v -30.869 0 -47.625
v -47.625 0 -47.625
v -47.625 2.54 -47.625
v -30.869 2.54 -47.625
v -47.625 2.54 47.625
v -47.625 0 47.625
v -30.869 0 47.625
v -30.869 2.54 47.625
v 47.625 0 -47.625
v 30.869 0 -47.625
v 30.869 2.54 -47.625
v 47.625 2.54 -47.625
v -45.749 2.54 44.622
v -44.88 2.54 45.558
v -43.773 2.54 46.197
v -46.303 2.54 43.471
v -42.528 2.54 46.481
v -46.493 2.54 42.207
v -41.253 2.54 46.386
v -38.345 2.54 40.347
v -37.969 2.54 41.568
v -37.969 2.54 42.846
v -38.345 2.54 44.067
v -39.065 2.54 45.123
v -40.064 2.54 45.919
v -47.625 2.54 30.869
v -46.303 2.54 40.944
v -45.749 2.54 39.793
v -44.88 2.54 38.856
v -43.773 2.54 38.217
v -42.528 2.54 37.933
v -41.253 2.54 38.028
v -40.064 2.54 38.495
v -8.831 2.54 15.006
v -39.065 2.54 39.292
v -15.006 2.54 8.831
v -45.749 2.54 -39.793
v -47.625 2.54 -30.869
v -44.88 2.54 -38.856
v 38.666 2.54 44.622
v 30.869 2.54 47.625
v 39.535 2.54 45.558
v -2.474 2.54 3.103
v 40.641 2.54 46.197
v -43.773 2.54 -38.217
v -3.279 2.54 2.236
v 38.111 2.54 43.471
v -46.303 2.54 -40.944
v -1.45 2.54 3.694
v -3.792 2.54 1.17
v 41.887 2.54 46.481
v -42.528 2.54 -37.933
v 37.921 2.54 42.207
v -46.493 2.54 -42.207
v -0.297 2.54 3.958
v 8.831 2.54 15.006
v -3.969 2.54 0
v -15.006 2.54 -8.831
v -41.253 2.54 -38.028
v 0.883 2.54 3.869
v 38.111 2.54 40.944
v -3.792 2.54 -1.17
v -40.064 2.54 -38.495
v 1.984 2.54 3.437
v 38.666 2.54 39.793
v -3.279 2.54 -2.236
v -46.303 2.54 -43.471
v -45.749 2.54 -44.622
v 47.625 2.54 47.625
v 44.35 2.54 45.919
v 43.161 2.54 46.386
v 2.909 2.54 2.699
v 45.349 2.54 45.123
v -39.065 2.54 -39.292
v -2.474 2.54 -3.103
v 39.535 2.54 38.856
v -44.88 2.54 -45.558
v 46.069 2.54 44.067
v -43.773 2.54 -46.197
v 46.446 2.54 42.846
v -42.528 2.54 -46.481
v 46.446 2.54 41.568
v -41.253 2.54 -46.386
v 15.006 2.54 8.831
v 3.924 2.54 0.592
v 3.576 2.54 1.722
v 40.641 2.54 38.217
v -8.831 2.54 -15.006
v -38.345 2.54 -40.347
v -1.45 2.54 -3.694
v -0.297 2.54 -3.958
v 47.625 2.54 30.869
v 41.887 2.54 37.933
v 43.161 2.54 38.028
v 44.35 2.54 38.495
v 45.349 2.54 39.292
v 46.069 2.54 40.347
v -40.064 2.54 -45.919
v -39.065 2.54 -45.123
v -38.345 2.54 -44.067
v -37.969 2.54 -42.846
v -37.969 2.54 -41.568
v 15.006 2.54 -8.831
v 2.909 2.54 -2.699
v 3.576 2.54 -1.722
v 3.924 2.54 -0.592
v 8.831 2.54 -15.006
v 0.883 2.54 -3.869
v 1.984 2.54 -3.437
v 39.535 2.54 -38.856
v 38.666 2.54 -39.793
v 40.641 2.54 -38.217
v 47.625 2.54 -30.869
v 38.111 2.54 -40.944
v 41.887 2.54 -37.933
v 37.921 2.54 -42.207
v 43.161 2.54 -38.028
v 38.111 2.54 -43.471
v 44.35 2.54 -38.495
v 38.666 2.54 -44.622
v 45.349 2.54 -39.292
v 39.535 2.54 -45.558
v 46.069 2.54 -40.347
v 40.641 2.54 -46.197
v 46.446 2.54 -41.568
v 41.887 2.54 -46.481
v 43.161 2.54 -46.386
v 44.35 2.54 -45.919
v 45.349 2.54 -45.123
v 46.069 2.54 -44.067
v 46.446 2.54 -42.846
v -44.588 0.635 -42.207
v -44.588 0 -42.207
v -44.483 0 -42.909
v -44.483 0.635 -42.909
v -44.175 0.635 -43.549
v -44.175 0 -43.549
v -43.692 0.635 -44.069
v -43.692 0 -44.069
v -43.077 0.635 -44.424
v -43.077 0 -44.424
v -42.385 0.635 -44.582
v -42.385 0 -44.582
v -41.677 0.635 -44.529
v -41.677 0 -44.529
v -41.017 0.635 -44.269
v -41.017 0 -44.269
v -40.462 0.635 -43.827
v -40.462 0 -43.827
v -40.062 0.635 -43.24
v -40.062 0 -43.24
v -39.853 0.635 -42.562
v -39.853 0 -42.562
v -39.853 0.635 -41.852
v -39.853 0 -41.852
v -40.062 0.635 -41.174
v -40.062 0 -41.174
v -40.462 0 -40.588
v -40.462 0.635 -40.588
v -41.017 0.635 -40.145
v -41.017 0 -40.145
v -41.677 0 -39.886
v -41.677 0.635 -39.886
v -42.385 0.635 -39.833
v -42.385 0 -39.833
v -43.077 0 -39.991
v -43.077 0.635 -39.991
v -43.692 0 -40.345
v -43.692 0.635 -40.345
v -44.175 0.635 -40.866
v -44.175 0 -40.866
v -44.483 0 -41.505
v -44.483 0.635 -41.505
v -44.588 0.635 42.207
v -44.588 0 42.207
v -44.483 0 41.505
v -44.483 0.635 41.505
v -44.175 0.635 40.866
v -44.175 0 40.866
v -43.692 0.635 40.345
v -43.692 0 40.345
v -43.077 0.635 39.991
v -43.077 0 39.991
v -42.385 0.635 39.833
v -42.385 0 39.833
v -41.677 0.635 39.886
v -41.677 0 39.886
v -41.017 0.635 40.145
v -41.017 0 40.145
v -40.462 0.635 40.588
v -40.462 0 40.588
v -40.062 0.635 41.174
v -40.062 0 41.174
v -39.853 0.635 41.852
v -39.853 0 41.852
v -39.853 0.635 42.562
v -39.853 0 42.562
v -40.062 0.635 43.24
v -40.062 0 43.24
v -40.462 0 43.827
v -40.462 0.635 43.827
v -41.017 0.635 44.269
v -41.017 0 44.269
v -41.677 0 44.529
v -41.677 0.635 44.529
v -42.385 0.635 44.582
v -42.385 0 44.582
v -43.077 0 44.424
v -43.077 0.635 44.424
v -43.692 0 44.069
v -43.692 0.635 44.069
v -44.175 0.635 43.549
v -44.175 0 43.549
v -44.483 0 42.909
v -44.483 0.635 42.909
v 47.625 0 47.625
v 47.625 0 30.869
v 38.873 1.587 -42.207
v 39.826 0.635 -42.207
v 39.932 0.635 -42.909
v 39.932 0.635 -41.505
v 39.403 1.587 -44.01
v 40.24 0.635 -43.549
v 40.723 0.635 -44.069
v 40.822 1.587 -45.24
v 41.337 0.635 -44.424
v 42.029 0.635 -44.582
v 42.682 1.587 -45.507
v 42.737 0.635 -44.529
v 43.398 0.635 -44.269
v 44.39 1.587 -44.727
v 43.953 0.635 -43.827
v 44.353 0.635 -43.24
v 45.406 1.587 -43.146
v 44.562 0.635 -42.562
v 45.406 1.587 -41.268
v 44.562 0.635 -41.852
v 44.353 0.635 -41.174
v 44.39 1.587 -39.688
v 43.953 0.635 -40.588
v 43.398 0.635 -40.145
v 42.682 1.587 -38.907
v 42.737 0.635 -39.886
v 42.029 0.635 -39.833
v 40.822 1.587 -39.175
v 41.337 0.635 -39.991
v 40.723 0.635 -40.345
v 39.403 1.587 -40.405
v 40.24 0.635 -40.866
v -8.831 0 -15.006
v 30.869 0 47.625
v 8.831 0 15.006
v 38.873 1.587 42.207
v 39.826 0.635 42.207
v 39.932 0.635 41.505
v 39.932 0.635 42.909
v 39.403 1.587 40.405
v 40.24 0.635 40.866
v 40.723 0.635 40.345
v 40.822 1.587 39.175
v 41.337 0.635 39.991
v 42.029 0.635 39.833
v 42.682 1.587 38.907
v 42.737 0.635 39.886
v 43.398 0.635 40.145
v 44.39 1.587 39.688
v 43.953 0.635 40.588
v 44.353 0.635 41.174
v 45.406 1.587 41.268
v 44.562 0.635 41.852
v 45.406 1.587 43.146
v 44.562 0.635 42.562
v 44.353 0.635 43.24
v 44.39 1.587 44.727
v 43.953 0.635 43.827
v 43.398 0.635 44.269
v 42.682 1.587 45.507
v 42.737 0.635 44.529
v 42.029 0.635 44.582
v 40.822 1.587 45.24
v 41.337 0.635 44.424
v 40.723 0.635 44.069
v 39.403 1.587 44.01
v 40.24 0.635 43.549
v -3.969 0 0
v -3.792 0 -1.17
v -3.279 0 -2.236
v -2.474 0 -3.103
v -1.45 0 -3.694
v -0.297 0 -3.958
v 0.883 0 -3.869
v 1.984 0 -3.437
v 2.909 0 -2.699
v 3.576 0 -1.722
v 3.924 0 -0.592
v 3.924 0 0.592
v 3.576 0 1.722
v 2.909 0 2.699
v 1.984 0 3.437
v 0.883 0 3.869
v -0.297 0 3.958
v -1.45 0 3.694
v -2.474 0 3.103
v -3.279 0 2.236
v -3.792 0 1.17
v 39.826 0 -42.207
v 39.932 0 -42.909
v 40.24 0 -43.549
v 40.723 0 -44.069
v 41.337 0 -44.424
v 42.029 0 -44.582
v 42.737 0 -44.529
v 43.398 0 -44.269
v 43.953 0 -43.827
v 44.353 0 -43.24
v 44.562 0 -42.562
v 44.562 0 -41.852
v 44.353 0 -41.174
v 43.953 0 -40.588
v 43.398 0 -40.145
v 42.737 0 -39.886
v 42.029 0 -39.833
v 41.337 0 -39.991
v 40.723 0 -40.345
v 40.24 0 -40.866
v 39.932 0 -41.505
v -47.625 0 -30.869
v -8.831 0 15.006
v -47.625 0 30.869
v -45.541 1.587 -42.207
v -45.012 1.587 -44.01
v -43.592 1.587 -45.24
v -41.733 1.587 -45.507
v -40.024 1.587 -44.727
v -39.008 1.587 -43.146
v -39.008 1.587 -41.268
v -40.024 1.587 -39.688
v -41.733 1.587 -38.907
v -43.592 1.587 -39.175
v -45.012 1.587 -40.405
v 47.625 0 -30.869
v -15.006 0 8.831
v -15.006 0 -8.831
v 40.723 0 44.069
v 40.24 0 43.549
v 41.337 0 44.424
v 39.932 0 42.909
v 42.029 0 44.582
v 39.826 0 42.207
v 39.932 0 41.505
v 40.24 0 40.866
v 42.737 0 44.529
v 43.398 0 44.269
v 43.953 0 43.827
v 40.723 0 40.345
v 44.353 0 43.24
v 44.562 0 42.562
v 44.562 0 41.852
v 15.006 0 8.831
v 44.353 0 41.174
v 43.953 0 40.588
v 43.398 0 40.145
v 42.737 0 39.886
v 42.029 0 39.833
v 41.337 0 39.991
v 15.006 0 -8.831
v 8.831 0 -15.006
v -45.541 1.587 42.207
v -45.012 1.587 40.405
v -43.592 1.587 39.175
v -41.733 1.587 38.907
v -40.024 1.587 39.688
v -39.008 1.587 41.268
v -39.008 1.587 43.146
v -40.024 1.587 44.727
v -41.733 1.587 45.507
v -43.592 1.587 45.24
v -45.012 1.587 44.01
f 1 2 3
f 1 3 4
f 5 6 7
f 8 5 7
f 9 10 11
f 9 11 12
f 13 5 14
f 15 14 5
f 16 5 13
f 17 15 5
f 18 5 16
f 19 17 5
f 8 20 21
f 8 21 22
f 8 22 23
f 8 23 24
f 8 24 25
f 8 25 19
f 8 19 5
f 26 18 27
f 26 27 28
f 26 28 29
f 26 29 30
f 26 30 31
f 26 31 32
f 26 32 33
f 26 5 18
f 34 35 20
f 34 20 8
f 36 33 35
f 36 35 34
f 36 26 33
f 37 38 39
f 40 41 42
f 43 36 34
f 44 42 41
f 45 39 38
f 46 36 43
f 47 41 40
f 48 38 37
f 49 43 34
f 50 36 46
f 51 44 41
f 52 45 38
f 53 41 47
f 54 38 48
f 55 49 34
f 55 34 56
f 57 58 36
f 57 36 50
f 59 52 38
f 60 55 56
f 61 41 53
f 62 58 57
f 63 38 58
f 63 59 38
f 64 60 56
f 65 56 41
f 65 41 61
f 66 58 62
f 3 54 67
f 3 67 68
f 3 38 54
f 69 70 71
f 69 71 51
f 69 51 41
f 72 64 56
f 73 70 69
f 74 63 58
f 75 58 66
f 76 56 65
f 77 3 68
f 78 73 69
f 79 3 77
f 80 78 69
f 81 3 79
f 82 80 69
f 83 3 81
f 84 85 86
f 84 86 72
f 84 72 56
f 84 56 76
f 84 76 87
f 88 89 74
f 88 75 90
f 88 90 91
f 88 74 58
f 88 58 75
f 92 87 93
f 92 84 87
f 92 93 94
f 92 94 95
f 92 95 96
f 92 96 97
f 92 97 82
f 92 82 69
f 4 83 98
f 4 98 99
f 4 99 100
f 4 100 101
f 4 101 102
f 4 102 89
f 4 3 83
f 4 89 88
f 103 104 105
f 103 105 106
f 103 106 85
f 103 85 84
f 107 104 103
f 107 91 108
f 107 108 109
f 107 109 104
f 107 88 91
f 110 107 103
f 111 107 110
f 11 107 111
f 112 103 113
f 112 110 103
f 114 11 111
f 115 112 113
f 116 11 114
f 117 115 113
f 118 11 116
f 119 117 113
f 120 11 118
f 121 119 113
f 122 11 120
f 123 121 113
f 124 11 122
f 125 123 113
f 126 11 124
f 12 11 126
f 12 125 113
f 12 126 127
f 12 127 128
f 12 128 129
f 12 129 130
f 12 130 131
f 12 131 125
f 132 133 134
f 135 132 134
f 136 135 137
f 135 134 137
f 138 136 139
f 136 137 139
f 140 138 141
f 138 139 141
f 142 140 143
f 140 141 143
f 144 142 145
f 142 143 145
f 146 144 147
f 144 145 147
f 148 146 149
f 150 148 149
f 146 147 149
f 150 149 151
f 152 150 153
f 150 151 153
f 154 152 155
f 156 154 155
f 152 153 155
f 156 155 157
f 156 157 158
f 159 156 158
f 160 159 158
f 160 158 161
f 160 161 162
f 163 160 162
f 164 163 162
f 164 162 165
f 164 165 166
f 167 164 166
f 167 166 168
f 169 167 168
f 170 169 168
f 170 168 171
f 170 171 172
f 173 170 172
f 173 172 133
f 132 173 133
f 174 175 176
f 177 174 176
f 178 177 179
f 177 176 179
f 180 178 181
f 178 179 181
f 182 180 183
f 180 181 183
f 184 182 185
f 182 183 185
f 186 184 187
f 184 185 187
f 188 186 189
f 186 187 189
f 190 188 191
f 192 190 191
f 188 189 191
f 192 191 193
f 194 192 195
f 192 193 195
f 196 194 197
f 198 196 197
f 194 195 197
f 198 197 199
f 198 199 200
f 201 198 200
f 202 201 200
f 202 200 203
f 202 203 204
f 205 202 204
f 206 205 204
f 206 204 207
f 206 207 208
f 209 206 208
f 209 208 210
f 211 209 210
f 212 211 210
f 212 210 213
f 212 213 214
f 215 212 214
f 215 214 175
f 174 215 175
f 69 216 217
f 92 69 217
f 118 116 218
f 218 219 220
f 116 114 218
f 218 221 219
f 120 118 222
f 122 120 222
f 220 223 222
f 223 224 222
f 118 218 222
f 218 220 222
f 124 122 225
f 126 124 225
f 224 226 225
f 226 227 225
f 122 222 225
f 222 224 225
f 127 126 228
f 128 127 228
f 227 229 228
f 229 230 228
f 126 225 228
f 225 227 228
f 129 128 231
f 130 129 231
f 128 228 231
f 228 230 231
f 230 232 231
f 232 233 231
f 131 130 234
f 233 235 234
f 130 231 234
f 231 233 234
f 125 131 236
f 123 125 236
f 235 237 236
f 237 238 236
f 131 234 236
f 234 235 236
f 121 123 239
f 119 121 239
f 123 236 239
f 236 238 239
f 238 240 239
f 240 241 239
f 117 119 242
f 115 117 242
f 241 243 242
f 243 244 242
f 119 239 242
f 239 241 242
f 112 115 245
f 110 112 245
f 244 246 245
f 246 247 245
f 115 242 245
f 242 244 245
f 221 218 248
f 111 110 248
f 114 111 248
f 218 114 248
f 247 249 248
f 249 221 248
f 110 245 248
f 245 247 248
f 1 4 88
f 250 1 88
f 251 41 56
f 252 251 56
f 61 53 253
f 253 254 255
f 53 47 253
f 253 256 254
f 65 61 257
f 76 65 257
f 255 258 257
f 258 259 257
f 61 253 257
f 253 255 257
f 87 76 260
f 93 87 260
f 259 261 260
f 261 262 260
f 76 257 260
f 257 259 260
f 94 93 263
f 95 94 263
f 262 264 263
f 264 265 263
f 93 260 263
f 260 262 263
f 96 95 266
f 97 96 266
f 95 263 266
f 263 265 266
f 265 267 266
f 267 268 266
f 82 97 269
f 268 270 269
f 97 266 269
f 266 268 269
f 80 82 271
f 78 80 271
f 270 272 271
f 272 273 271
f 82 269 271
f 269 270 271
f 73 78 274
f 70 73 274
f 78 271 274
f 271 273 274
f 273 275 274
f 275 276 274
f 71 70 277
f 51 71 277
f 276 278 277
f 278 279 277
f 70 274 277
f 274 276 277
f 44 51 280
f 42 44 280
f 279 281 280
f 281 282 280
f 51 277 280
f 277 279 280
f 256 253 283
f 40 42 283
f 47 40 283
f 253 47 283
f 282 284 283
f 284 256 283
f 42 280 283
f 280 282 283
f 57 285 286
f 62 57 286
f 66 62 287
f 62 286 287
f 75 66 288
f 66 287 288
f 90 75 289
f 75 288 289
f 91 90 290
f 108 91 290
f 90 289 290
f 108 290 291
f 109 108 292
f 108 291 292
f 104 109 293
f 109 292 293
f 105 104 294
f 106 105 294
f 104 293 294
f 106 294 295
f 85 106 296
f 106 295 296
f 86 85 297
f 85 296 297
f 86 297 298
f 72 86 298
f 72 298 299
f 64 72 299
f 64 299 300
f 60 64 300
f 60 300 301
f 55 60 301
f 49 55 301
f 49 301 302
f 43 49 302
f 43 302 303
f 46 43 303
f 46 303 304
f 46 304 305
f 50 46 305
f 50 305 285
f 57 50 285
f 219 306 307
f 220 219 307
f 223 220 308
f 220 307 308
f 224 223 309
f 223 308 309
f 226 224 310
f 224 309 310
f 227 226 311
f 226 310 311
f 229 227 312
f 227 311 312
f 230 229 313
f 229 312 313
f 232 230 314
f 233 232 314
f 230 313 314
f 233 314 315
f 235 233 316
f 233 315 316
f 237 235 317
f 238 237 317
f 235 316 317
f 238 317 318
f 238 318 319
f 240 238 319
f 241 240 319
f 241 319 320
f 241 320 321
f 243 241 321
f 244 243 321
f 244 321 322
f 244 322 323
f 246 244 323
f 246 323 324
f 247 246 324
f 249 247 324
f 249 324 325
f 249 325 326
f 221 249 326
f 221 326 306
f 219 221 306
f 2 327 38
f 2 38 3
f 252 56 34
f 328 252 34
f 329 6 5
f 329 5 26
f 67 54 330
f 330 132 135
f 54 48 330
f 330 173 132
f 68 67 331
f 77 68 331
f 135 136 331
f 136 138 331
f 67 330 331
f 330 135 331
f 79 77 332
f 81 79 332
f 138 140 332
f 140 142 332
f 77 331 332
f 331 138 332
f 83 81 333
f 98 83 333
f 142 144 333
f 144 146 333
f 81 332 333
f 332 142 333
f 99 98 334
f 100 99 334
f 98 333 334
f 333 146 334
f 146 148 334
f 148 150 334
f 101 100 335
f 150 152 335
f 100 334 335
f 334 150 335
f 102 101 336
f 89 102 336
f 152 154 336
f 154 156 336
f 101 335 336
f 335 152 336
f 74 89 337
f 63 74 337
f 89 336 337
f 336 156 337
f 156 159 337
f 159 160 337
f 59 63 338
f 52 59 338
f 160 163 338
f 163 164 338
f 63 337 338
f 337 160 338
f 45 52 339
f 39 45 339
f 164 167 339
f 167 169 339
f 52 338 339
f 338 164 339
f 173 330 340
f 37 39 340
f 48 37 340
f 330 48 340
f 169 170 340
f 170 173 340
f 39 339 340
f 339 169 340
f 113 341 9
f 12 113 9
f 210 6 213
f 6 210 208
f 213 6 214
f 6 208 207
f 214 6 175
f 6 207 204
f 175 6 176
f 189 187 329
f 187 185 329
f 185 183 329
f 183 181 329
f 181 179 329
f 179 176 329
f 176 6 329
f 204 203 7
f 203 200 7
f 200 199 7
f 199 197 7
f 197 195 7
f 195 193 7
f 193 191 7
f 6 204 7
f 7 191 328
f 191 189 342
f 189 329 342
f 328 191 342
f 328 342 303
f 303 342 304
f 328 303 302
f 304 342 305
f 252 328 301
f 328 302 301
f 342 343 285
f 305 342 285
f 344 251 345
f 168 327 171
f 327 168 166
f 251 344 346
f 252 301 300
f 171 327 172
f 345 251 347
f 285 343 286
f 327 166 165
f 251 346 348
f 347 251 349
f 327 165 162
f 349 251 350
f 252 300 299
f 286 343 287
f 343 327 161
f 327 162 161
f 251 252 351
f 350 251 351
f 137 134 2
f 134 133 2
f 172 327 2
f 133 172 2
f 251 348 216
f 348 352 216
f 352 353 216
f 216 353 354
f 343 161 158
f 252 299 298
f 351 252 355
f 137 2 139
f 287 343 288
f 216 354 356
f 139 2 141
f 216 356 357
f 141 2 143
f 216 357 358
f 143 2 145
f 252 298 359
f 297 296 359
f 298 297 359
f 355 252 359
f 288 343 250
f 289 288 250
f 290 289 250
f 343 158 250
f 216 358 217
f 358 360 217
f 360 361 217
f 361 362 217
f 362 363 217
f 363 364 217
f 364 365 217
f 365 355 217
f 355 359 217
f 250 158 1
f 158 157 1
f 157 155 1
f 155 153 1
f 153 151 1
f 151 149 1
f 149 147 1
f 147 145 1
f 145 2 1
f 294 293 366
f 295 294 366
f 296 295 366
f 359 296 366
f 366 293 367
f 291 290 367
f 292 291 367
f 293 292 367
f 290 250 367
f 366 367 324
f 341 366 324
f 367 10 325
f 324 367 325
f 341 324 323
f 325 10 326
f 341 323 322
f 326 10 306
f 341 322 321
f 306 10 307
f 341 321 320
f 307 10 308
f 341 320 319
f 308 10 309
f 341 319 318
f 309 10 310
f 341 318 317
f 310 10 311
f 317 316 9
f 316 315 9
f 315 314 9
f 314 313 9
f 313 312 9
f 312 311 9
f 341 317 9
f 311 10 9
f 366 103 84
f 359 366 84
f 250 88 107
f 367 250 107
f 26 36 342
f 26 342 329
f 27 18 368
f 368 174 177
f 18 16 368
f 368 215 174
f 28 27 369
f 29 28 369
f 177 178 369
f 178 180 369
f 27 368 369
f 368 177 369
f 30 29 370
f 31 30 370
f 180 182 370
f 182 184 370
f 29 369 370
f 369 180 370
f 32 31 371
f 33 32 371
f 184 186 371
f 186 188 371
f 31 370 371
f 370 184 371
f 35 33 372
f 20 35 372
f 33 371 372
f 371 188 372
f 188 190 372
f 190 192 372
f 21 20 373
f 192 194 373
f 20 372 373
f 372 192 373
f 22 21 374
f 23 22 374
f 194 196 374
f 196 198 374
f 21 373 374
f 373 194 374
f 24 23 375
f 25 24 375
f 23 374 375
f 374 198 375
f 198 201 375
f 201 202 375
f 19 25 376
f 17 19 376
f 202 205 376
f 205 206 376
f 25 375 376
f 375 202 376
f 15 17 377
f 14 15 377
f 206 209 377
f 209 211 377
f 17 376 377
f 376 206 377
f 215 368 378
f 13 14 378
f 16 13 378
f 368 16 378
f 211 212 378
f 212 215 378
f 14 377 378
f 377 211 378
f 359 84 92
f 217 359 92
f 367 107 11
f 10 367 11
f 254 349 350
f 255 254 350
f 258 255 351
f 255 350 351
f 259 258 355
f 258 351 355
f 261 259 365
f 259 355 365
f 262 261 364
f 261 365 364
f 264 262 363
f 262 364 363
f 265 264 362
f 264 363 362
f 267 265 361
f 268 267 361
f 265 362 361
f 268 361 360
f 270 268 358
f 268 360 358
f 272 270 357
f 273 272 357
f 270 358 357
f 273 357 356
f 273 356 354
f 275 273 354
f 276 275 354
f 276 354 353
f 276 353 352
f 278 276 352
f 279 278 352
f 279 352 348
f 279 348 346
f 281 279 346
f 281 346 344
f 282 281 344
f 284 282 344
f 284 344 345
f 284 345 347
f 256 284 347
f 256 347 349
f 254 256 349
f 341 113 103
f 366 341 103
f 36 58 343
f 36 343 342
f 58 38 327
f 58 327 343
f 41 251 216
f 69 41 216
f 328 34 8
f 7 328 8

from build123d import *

# Parameters (mm, degrees)
SKETCH1_W                          = 95.25
SKETCH1_H                          = 95.25
BASE_EXTRUDE_DEPTH                 = 2.54
F_3_16_0_1875_DIAMETER_HOLE1_D     = 4.7625
F_3_16_0_1875_DIAMETER_HOLE1_DEPTH = 2.54
F_3_16_0_1875_DIAMETER_HOLE1_TIP   = 1.430799349
CUT_EXTRUDE1_REACH                 = 69.4
F_5_16_0_3125_DIAMETER_HOLE1_D     = 7.9375
CHAMFER1_SIZE                      = 1.905


with BuildPart() as part:
    # Sketch1 → Base Extrude (new body)
    with BuildSketch(Plane(origin=(0, 0, 0), x_dir=(1, 0, 0), z_dir=(0, 1, 0))):
        Rectangle(SKETCH1_W, SKETCH1_H)
    extrude(amount=BASE_EXTRUDE_DEPTH)

    # 3/16 (0.1875) Diameter Hole1
    with Locations(Plane(origin=(0, 2.54, 0), x_dir=(1, 0, 0), z_dir=(0, 1, 0))):
        with Locations((-42.207203769, 42.207203769), (42.207203769, 42.207203769), (42.207203769, -42.207203769), (-42.207203769, -42.207203769)):
            Hole(F_3_16_0_1875_DIAMETER_HOLE1_D / 2, depth=F_3_16_0_1875_DIAMETER_HOLE1_DEPTH)
            with Locations((0, 0, -(F_3_16_0_1875_DIAMETER_HOLE1_DEPTH + F_3_16_0_1875_DIAMETER_HOLE1_TIP / 2))):  # 118° drill point
                Cone(0, F_3_16_0_1875_DIAMETER_HOLE1_D / 2, F_3_16_0_1875_DIAMETER_HOLE1_TIP, mode=Mode.SUBTRACT)

    # Sketch12 → Cut-Extrude1 (cut, up to next)
    with BuildSketch(Plane(origin=(0, 2.54, 0), x_dir=(1, 0, 0), z_dir=(0, 1, 0)), mode=Mode.PRIVATE) as cut_extrude1_sk1:
        Polygon((-15.006272328, 8.830810905), (-15.006272328, -8.830810905), (-47.625, -30.869032315), (-47.625, 30.869032315), align=None)
    cut_extrude1_tool1 = extrude(cut_extrude1_sk1.sketch, amount=-CUT_EXTRUDE1_REACH, mode=Mode.PRIVATE) & part.part
    # Sketch12 → Cut-Extrude1 (cut, up to next)
    with BuildSketch(Plane(origin=(0, 2.54, 0), x_dir=(1, 0, 0), z_dir=(0, 1, 0)), mode=Mode.PRIVATE) as cut_extrude1_sk2:
        Polygon((30.869032315, 47.625), (-30.869032315, 47.625), (-8.830810905, 15.006272328), (8.830810905, 15.006272328), align=None)
    cut_extrude1_tool2 = extrude(cut_extrude1_sk2.sketch, amount=-CUT_EXTRUDE1_REACH, mode=Mode.PRIVATE) & part.part
    # Sketch12 → Cut-Extrude1 (cut, up to next)
    with BuildSketch(Plane(origin=(0, 2.54, 0), x_dir=(1, 0, 0), z_dir=(0, 1, 0)), mode=Mode.PRIVATE) as cut_extrude1_sk3:
        Polygon((47.625, -30.869032315), (47.625, 30.869032315), (15.006272328, 8.830810905), (15.006272328, -8.830810905), align=None)
    cut_extrude1_tool3 = extrude(cut_extrude1_sk3.sketch, amount=-CUT_EXTRUDE1_REACH, mode=Mode.PRIVATE) & part.part
    # Sketch12 → Cut-Extrude1 (cut, up to next)
    with BuildSketch(Plane(origin=(0, 2.54, 0), x_dir=(1, 0, 0), z_dir=(0, 1, 0)), mode=Mode.PRIVATE) as cut_extrude1_sk4:
        Polygon((-30.869032315, -47.625), (30.869032315, -47.625), (8.830810905, -15.006272328), (-8.830810905, -15.006272328), align=None)
    cut_extrude1_tool4 = extrude(cut_extrude1_sk4.sketch, amount=-CUT_EXTRUDE1_REACH, mode=Mode.PRIVATE) & part.part
    add(cut_extrude1_tool1.solids().sort_by_distance((-34.333527, 2.54, 0))[0], mode=Mode.SUBTRACT)
    add(cut_extrude1_tool2.solids().sort_by_distance((0, 2.54, -34.333527))[0], mode=Mode.SUBTRACT)
    add(cut_extrude1_tool3.solids().sort_by_distance((34.333527, 2.54, 0))[0], mode=Mode.SUBTRACT)
    add(cut_extrude1_tool4.solids().sort_by_distance((0, 2.54, 34.333527))[0], mode=Mode.SUBTRACT)

    # 5/16 (0.3125) Diameter Hole1 (through all)
    with Locations(Plane(origin=(0, 2.54, 0), x_dir=(1, 0, 0), z_dir=(0, 1, 0))):
        with Locations((0, 0)):
            Hole(F_5_16_0_3125_DIAMETER_HOLE1_D / 2)

    # Chamfer1
    chamfer1_edges = [part.edges().sort_by_distance(p)[0] for p in [
        (-39.825953769, 2.54, 42.207203769),
        (44.588453769, 2.54, 42.207203769),
        (44.588453769, 2.54, -42.207203769),
        (-39.825953769, 2.54, -42.207203769),
    ]]
    chamfer(chamfer1_edges, length=CHAMFER1_SIZE)


solid = part.part
